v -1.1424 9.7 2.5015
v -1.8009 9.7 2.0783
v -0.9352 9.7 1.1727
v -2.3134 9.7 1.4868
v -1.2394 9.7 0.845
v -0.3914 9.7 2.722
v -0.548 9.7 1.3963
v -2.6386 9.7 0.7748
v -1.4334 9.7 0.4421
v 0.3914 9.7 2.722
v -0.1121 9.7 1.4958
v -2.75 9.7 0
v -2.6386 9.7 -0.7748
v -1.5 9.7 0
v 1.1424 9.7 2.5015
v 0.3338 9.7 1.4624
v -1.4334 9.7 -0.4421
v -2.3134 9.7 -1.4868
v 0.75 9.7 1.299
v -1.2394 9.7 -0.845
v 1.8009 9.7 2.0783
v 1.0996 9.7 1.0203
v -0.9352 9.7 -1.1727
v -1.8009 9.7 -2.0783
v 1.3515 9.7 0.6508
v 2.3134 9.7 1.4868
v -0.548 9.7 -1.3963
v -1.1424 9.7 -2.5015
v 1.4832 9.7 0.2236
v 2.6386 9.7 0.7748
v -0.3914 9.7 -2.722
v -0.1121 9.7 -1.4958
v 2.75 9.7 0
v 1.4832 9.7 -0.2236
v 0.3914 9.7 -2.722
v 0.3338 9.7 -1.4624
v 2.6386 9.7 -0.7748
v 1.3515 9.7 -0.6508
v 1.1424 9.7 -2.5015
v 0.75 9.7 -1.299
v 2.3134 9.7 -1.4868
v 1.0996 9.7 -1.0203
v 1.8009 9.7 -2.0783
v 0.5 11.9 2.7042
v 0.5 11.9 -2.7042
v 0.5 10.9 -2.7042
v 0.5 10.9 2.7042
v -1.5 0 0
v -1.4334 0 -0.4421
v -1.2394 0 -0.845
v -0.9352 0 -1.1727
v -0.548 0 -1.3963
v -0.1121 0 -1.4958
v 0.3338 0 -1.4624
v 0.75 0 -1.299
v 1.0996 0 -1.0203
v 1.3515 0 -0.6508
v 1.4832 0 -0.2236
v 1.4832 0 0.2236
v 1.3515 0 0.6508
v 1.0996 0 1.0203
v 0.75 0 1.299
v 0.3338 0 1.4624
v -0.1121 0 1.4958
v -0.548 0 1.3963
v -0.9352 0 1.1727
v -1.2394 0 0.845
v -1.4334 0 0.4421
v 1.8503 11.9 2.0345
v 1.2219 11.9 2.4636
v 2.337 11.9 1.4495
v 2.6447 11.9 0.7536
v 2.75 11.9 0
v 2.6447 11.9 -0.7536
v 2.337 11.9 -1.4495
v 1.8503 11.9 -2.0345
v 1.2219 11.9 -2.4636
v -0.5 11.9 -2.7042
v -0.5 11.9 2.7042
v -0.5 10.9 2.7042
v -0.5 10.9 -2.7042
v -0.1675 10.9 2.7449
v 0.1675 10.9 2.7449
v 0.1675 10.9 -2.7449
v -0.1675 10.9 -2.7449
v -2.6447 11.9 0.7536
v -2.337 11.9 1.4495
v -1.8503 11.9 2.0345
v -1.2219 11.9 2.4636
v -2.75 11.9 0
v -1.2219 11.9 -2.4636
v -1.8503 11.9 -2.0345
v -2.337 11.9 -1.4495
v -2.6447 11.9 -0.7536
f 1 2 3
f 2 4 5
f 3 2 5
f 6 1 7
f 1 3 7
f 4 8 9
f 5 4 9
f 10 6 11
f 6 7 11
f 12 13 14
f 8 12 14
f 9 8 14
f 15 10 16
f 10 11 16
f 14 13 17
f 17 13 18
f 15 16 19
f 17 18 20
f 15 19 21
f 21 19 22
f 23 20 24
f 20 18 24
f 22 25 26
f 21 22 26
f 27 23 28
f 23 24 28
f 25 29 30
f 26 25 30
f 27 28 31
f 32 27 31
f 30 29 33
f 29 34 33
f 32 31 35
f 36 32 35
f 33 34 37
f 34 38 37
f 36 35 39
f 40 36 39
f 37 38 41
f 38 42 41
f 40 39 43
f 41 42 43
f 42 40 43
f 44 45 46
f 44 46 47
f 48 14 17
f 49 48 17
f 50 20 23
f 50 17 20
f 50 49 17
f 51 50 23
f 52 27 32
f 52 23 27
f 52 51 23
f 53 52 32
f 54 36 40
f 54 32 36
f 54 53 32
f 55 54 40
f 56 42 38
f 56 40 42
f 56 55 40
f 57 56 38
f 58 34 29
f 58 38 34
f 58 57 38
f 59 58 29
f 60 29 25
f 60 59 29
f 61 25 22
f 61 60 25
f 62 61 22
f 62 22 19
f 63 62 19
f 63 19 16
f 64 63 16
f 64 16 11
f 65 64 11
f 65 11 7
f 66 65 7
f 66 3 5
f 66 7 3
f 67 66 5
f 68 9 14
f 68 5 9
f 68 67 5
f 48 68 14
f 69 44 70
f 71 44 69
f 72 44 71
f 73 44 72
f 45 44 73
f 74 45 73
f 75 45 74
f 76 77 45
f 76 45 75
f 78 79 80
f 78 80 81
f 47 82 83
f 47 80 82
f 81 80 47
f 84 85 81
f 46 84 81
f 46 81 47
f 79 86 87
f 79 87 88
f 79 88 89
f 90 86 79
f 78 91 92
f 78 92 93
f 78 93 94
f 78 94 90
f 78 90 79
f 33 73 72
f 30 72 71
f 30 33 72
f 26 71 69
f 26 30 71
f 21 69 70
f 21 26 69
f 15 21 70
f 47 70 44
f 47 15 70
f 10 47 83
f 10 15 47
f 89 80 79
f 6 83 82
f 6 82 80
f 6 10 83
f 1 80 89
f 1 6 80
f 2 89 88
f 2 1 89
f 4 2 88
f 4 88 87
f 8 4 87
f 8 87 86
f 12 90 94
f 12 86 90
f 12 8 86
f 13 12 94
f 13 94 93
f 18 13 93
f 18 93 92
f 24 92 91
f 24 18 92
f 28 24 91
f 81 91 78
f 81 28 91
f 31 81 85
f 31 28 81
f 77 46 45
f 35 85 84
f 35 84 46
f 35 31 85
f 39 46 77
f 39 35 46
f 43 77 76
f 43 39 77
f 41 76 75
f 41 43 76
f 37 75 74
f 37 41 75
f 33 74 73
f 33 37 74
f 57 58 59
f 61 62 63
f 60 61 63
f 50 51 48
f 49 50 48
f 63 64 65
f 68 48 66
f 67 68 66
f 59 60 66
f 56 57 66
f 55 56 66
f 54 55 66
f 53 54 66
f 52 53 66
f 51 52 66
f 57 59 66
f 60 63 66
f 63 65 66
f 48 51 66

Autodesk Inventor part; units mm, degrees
ref_plane "YZ Plane" through (0, 0, 0) normal (1, 0, 0) x (0, 1, 0)
ref_plane "XZ Plane" through (0, 0, 0) normal (0, 1, 0) x (-1, 0, 0)
ref_plane "XY Plane" through (0, 0, 0) normal (0, 0, 1) x (1, 0, 0)
sketch "Sketch1" plane through (0, 0, 0) normal (0, 1, 0) x (-1, 0, 0)
  circle A0 centre (0, 0) radius 1.5
  dimension "d0" = 3
extrude "Extrusion1" add sketch "Sketch1" along normal blind 9.7
sketch "Sketch2" plane through (0, 9.7, 0) normal (0, 1, 0) x (1, 0, 0)
  circle A0 centre (0, 0) radius 2.75
  dimension "d3" = 5.5
extrude "Extrusion2" add sketch "Sketch2" along normal blind 2.2
sketch "Sketch3" plane through (0, 11.9, 0) normal (0, 1, 0) x (1, 0, 0)
  line L0 (0.5, -4.7072) -> (-0.5, -4.7072)
  line L1 (-0.5, -4.7072) -> (-0.5, 4.7072)
  line L2 (-0.5, 4.7072) -> (0.5, 4.7072)
  line L3 (0.5, 4.7072) -> (0.5, -4.7072)
  line L4 (0.5, -4.7072) -> (-0.5, 4.7072) construction
  line L5 (-0.5, -4.7072) -> (0.5, 4.7072) construction
  point P0 (0, 0)
  dimension "d6" = 1
extrude "Extrusion3" cut sketch "Sketch3" against normal blind 1
properties part number "screw12x3mm" material "Stainless Steel"
